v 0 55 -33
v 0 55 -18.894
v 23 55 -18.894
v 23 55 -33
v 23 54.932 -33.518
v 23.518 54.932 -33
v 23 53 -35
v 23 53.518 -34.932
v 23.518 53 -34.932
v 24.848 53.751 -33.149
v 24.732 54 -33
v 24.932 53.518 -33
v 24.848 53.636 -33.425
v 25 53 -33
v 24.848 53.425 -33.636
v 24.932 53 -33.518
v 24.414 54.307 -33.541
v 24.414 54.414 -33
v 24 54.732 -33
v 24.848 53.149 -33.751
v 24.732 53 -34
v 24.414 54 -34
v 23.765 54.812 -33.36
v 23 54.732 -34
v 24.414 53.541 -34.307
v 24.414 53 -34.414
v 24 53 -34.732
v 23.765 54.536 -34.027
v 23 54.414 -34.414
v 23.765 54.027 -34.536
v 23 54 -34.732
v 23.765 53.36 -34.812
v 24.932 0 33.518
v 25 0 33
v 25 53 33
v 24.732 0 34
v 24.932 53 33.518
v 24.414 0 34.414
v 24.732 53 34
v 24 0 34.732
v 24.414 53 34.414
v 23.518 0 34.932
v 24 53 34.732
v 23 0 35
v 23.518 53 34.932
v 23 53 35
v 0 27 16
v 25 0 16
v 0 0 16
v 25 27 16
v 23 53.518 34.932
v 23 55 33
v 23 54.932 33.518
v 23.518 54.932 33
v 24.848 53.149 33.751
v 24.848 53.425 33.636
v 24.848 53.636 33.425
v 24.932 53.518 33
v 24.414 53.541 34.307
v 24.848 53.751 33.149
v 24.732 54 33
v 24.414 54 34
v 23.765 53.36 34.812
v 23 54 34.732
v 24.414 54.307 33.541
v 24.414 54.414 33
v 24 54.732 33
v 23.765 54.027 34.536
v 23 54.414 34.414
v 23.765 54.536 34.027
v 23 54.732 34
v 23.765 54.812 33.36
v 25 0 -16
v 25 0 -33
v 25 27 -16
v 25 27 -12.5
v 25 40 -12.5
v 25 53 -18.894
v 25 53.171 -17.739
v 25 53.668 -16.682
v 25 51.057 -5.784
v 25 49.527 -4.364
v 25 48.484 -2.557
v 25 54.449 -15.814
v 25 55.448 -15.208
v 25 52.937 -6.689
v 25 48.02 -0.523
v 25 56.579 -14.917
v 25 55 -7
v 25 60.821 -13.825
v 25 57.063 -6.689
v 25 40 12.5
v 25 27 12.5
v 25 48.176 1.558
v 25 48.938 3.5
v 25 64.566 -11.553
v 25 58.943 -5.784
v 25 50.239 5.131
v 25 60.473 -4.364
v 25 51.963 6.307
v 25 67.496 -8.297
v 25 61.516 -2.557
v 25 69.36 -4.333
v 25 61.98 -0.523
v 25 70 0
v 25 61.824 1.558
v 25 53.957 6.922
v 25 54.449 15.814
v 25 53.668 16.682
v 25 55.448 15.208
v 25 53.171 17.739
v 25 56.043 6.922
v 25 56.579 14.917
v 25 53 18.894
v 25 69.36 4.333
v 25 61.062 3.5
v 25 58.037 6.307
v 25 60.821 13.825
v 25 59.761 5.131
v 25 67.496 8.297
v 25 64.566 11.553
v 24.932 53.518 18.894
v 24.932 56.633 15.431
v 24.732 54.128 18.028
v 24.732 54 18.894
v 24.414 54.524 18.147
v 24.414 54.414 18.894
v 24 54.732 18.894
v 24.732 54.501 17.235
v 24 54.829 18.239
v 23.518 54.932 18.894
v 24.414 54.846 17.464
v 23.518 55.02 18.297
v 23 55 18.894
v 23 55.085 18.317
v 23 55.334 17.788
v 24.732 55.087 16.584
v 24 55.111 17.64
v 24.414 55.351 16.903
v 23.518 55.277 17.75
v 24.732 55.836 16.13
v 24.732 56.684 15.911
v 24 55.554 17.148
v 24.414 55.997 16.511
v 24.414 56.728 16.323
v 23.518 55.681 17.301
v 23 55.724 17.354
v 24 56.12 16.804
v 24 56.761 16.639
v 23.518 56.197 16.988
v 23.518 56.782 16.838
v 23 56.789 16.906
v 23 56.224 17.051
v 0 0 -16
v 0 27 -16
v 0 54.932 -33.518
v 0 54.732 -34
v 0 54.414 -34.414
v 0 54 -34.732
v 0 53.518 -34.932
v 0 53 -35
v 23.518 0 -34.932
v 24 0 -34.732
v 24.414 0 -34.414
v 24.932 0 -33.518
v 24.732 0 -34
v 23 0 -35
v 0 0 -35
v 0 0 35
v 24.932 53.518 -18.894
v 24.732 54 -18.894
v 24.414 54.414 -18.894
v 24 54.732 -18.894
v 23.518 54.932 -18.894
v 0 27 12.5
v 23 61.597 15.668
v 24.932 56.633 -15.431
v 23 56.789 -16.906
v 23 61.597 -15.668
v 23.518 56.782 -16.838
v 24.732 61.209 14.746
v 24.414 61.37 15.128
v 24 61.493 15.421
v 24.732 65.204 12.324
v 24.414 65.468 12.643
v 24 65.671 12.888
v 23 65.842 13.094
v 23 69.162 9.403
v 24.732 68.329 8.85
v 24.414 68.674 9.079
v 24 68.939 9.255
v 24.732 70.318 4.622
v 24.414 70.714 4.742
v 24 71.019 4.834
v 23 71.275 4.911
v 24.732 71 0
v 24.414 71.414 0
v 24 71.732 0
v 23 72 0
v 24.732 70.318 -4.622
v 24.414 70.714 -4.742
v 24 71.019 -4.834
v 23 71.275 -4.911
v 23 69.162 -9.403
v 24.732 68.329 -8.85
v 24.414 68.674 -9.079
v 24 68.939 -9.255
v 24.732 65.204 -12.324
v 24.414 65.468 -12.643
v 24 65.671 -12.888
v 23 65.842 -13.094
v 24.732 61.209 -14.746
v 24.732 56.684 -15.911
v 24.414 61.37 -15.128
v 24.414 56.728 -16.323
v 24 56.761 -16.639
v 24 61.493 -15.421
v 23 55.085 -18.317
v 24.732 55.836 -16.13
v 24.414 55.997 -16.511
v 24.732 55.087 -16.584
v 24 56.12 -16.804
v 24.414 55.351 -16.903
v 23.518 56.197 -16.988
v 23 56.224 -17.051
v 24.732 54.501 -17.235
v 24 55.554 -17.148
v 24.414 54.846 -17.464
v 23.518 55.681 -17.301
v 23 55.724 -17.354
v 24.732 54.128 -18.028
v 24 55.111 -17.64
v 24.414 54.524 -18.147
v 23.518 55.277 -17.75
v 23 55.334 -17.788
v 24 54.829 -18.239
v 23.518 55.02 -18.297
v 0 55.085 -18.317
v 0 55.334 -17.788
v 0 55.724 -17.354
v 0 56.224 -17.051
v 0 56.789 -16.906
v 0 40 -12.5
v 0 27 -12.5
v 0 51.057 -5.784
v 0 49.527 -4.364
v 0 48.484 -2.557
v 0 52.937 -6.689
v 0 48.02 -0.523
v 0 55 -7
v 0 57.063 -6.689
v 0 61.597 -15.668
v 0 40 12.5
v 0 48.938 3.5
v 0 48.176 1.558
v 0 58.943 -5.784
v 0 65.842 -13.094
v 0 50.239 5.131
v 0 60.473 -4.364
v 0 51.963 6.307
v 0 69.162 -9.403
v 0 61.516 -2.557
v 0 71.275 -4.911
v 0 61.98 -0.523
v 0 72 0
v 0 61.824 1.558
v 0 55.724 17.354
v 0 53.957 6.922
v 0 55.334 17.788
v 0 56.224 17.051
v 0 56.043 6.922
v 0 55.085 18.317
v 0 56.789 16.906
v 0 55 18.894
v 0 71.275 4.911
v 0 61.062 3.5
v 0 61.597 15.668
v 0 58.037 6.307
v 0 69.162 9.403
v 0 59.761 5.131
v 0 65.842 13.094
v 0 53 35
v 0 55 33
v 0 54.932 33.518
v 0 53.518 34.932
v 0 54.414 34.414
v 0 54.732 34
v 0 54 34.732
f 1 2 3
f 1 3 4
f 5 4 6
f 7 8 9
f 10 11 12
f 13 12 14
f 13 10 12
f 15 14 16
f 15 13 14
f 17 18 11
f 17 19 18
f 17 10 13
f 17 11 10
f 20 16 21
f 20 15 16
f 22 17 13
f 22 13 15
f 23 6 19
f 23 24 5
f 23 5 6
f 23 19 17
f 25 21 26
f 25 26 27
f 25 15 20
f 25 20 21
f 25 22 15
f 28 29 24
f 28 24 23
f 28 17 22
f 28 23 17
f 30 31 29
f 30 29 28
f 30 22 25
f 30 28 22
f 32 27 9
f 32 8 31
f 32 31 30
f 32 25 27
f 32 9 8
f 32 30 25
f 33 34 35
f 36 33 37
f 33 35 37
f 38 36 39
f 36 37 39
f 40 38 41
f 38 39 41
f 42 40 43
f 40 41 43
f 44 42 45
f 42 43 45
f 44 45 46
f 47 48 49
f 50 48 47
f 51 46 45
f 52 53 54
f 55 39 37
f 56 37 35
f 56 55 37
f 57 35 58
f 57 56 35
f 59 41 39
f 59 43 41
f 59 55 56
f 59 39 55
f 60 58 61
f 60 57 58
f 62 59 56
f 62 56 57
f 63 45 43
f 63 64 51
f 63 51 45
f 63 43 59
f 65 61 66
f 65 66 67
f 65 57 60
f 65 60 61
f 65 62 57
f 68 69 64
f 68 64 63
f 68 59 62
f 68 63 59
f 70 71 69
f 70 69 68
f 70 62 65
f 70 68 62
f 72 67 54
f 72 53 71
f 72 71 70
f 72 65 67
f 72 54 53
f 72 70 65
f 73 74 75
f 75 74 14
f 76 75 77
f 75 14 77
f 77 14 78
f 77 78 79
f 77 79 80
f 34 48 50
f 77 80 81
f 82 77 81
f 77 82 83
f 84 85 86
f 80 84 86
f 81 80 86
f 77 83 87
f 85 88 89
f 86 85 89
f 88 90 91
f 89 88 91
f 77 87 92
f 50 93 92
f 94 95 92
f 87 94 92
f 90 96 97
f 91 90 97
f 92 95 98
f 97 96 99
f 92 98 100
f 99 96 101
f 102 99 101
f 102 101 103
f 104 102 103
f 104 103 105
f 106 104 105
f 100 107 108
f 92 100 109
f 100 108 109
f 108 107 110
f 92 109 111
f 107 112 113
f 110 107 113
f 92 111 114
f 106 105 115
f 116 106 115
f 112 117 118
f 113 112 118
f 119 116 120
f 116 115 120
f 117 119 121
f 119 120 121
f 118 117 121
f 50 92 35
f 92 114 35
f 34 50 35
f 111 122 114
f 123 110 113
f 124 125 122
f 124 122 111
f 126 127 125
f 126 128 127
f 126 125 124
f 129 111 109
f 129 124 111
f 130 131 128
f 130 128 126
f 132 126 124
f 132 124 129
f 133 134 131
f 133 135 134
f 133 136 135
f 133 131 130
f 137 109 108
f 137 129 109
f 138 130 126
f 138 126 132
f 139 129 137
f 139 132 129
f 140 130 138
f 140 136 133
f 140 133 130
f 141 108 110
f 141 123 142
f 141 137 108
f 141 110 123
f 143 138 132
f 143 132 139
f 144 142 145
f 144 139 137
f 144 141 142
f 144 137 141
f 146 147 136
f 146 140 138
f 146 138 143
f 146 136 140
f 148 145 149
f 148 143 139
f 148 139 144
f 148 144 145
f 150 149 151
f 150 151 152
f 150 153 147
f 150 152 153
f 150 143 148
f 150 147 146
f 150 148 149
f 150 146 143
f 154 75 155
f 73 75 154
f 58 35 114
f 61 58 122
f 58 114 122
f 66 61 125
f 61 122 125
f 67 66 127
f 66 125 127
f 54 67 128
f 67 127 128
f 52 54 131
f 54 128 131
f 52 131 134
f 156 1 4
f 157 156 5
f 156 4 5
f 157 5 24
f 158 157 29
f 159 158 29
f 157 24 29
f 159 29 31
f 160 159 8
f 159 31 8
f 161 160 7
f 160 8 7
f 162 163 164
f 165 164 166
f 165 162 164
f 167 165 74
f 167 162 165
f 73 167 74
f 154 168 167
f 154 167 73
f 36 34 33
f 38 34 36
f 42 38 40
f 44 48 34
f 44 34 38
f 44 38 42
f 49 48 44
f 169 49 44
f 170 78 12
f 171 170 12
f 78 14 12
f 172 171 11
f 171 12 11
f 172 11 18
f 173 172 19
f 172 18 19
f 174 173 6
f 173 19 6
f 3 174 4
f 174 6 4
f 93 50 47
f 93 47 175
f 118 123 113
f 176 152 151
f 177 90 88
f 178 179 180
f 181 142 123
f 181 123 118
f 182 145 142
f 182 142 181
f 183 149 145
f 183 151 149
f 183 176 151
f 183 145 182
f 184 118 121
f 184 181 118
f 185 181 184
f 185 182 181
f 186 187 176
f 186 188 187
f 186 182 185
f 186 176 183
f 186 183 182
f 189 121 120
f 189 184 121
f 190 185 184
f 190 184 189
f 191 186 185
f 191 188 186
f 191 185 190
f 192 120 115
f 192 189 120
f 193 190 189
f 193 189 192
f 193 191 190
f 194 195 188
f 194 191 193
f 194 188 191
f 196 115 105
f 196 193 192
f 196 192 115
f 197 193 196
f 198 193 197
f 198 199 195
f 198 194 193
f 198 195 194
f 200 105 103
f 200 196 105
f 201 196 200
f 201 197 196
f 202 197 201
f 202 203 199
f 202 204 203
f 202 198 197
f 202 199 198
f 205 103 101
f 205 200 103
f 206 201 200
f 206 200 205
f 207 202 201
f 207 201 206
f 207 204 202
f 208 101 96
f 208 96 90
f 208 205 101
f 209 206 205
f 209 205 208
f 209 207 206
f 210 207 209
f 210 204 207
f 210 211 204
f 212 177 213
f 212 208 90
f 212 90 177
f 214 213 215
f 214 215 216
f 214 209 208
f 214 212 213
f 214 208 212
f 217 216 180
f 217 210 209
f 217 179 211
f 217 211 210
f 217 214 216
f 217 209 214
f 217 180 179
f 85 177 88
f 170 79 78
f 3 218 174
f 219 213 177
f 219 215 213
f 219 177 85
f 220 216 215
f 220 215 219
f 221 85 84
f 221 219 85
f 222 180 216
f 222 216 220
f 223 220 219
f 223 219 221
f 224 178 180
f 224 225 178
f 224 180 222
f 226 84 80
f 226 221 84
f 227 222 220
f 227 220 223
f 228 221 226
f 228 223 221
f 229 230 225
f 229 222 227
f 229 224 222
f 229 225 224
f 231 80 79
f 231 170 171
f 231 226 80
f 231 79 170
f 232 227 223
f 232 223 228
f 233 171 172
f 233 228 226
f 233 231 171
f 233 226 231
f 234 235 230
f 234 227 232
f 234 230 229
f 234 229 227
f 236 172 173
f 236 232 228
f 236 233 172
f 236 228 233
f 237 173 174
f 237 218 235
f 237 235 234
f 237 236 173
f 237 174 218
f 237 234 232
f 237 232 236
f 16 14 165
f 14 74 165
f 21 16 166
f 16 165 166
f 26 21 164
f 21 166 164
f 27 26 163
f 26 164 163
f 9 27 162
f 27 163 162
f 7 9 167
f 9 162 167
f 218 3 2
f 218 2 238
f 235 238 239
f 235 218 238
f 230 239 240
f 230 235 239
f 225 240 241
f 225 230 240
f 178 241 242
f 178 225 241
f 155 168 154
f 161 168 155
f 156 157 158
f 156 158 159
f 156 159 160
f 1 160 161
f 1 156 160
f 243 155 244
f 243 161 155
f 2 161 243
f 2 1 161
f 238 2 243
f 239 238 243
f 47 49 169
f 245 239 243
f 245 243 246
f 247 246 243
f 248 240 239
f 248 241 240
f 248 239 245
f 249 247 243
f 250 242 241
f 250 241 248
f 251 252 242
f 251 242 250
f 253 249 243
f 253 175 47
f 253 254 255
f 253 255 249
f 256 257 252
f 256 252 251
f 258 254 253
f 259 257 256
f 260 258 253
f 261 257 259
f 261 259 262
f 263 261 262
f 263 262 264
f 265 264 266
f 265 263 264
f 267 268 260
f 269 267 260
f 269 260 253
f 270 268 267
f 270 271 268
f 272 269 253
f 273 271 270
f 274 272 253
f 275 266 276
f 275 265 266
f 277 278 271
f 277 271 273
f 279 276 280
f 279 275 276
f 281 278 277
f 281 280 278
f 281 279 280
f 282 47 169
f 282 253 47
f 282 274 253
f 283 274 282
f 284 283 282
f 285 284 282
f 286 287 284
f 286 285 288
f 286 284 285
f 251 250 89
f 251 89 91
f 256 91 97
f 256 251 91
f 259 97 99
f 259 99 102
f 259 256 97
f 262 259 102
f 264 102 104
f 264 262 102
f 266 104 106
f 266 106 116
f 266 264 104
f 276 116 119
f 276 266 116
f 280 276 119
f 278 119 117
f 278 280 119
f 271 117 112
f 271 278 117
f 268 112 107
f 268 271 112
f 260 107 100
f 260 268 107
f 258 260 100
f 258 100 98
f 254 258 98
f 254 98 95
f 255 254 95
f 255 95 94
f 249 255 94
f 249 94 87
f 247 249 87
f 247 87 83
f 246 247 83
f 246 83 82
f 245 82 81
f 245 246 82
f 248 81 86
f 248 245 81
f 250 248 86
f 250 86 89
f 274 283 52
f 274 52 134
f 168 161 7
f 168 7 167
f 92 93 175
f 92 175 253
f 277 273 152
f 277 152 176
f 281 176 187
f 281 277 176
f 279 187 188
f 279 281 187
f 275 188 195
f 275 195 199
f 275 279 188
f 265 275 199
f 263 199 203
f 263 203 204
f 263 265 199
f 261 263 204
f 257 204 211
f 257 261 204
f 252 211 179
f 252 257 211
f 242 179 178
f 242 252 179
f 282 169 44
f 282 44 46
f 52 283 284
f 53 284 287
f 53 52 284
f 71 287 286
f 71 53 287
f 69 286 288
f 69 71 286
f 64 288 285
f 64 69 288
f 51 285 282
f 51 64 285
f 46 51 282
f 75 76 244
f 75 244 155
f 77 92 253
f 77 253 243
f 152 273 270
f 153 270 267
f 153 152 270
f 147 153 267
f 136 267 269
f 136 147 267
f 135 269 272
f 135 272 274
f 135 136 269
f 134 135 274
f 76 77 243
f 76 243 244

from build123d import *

# Parameters (mm, degrees)
SKETCH1_R           = 7
BOSS_EXTRUDE1_DEPTH = 25
CUT_EXTRUDE1_DEPTH  = 84.868945385
FILLET1_R           = 2
FILLET2_R           = 2


with BuildPart() as part:
    # Sketch1 → Boss-Extrude1 (new body)
    with BuildSketch(Plane(origin=(0, 0, 0), x_dir=(0, 0, -1), z_dir=(1, 0, 0))):
        with BuildLine():
            Line((17, 55), (35, 55))
            Line((35, 55), (35, 0))
            Line((35, 0), (-35, 0))
            Line((-35, 0), (-35, 55))
            Line((-35, 55), (-17, 55))
            ThreePointArc((-17, 55), (0, 72), (17, 55))
        make_face()
        with Locations((0, 55)):
            Circle(SKETCH1_R, mode=Mode.SUBTRACT)
    extrude(amount=BOSS_EXTRUDE1_DEPTH)

    # Sketch2 → Cut-Extrude1 (cut, through all)
    with BuildSketch(Plane(origin=(25, 0, 0), x_dir=(0, 0, -1), z_dir=(1, 0, 0))):
        Polygon((-16, 27), (-12.5, 27), (-12.5, 40), (12.5, 40), (12.5, 27), (16, 27), (16, 0), (-16, 0), align=None)
    extrude(amount=-CUT_EXTRUDE1_DEPTH, mode=Mode.SUBTRACT)

    # Fillet1
    fillet1_edges = [part.edges().sort_by_distance(p)[0] for p in [
        (12.5, 55, 35),
        (12.5, 55, 17),
        (12.5, 55, -17),
        (12.5, 55, -35),
    ]]
    fillet(fillet1_edges, radius=FILLET1_R)

    # Fillet2
    fillet2_edges = [part.edges().sort_by_distance(p)[0] for p in [
        (25, 26.5, -35),
        (25, 55, -25.947221814),
        (25, 72, 0),
        (25, 55, 25.947221814),
        (25, 26.5, 35),
        (25, 54.414213562, 34.414213562),
        (25, 54.414213562, -34.414213562),
        (25, 55.513216117, -17.55673152),
        (25, 55.513216117, 17.55673152),
    ]]
    fillet(fillet2_edges, radius=FILLET2_R)


solid = part.part
